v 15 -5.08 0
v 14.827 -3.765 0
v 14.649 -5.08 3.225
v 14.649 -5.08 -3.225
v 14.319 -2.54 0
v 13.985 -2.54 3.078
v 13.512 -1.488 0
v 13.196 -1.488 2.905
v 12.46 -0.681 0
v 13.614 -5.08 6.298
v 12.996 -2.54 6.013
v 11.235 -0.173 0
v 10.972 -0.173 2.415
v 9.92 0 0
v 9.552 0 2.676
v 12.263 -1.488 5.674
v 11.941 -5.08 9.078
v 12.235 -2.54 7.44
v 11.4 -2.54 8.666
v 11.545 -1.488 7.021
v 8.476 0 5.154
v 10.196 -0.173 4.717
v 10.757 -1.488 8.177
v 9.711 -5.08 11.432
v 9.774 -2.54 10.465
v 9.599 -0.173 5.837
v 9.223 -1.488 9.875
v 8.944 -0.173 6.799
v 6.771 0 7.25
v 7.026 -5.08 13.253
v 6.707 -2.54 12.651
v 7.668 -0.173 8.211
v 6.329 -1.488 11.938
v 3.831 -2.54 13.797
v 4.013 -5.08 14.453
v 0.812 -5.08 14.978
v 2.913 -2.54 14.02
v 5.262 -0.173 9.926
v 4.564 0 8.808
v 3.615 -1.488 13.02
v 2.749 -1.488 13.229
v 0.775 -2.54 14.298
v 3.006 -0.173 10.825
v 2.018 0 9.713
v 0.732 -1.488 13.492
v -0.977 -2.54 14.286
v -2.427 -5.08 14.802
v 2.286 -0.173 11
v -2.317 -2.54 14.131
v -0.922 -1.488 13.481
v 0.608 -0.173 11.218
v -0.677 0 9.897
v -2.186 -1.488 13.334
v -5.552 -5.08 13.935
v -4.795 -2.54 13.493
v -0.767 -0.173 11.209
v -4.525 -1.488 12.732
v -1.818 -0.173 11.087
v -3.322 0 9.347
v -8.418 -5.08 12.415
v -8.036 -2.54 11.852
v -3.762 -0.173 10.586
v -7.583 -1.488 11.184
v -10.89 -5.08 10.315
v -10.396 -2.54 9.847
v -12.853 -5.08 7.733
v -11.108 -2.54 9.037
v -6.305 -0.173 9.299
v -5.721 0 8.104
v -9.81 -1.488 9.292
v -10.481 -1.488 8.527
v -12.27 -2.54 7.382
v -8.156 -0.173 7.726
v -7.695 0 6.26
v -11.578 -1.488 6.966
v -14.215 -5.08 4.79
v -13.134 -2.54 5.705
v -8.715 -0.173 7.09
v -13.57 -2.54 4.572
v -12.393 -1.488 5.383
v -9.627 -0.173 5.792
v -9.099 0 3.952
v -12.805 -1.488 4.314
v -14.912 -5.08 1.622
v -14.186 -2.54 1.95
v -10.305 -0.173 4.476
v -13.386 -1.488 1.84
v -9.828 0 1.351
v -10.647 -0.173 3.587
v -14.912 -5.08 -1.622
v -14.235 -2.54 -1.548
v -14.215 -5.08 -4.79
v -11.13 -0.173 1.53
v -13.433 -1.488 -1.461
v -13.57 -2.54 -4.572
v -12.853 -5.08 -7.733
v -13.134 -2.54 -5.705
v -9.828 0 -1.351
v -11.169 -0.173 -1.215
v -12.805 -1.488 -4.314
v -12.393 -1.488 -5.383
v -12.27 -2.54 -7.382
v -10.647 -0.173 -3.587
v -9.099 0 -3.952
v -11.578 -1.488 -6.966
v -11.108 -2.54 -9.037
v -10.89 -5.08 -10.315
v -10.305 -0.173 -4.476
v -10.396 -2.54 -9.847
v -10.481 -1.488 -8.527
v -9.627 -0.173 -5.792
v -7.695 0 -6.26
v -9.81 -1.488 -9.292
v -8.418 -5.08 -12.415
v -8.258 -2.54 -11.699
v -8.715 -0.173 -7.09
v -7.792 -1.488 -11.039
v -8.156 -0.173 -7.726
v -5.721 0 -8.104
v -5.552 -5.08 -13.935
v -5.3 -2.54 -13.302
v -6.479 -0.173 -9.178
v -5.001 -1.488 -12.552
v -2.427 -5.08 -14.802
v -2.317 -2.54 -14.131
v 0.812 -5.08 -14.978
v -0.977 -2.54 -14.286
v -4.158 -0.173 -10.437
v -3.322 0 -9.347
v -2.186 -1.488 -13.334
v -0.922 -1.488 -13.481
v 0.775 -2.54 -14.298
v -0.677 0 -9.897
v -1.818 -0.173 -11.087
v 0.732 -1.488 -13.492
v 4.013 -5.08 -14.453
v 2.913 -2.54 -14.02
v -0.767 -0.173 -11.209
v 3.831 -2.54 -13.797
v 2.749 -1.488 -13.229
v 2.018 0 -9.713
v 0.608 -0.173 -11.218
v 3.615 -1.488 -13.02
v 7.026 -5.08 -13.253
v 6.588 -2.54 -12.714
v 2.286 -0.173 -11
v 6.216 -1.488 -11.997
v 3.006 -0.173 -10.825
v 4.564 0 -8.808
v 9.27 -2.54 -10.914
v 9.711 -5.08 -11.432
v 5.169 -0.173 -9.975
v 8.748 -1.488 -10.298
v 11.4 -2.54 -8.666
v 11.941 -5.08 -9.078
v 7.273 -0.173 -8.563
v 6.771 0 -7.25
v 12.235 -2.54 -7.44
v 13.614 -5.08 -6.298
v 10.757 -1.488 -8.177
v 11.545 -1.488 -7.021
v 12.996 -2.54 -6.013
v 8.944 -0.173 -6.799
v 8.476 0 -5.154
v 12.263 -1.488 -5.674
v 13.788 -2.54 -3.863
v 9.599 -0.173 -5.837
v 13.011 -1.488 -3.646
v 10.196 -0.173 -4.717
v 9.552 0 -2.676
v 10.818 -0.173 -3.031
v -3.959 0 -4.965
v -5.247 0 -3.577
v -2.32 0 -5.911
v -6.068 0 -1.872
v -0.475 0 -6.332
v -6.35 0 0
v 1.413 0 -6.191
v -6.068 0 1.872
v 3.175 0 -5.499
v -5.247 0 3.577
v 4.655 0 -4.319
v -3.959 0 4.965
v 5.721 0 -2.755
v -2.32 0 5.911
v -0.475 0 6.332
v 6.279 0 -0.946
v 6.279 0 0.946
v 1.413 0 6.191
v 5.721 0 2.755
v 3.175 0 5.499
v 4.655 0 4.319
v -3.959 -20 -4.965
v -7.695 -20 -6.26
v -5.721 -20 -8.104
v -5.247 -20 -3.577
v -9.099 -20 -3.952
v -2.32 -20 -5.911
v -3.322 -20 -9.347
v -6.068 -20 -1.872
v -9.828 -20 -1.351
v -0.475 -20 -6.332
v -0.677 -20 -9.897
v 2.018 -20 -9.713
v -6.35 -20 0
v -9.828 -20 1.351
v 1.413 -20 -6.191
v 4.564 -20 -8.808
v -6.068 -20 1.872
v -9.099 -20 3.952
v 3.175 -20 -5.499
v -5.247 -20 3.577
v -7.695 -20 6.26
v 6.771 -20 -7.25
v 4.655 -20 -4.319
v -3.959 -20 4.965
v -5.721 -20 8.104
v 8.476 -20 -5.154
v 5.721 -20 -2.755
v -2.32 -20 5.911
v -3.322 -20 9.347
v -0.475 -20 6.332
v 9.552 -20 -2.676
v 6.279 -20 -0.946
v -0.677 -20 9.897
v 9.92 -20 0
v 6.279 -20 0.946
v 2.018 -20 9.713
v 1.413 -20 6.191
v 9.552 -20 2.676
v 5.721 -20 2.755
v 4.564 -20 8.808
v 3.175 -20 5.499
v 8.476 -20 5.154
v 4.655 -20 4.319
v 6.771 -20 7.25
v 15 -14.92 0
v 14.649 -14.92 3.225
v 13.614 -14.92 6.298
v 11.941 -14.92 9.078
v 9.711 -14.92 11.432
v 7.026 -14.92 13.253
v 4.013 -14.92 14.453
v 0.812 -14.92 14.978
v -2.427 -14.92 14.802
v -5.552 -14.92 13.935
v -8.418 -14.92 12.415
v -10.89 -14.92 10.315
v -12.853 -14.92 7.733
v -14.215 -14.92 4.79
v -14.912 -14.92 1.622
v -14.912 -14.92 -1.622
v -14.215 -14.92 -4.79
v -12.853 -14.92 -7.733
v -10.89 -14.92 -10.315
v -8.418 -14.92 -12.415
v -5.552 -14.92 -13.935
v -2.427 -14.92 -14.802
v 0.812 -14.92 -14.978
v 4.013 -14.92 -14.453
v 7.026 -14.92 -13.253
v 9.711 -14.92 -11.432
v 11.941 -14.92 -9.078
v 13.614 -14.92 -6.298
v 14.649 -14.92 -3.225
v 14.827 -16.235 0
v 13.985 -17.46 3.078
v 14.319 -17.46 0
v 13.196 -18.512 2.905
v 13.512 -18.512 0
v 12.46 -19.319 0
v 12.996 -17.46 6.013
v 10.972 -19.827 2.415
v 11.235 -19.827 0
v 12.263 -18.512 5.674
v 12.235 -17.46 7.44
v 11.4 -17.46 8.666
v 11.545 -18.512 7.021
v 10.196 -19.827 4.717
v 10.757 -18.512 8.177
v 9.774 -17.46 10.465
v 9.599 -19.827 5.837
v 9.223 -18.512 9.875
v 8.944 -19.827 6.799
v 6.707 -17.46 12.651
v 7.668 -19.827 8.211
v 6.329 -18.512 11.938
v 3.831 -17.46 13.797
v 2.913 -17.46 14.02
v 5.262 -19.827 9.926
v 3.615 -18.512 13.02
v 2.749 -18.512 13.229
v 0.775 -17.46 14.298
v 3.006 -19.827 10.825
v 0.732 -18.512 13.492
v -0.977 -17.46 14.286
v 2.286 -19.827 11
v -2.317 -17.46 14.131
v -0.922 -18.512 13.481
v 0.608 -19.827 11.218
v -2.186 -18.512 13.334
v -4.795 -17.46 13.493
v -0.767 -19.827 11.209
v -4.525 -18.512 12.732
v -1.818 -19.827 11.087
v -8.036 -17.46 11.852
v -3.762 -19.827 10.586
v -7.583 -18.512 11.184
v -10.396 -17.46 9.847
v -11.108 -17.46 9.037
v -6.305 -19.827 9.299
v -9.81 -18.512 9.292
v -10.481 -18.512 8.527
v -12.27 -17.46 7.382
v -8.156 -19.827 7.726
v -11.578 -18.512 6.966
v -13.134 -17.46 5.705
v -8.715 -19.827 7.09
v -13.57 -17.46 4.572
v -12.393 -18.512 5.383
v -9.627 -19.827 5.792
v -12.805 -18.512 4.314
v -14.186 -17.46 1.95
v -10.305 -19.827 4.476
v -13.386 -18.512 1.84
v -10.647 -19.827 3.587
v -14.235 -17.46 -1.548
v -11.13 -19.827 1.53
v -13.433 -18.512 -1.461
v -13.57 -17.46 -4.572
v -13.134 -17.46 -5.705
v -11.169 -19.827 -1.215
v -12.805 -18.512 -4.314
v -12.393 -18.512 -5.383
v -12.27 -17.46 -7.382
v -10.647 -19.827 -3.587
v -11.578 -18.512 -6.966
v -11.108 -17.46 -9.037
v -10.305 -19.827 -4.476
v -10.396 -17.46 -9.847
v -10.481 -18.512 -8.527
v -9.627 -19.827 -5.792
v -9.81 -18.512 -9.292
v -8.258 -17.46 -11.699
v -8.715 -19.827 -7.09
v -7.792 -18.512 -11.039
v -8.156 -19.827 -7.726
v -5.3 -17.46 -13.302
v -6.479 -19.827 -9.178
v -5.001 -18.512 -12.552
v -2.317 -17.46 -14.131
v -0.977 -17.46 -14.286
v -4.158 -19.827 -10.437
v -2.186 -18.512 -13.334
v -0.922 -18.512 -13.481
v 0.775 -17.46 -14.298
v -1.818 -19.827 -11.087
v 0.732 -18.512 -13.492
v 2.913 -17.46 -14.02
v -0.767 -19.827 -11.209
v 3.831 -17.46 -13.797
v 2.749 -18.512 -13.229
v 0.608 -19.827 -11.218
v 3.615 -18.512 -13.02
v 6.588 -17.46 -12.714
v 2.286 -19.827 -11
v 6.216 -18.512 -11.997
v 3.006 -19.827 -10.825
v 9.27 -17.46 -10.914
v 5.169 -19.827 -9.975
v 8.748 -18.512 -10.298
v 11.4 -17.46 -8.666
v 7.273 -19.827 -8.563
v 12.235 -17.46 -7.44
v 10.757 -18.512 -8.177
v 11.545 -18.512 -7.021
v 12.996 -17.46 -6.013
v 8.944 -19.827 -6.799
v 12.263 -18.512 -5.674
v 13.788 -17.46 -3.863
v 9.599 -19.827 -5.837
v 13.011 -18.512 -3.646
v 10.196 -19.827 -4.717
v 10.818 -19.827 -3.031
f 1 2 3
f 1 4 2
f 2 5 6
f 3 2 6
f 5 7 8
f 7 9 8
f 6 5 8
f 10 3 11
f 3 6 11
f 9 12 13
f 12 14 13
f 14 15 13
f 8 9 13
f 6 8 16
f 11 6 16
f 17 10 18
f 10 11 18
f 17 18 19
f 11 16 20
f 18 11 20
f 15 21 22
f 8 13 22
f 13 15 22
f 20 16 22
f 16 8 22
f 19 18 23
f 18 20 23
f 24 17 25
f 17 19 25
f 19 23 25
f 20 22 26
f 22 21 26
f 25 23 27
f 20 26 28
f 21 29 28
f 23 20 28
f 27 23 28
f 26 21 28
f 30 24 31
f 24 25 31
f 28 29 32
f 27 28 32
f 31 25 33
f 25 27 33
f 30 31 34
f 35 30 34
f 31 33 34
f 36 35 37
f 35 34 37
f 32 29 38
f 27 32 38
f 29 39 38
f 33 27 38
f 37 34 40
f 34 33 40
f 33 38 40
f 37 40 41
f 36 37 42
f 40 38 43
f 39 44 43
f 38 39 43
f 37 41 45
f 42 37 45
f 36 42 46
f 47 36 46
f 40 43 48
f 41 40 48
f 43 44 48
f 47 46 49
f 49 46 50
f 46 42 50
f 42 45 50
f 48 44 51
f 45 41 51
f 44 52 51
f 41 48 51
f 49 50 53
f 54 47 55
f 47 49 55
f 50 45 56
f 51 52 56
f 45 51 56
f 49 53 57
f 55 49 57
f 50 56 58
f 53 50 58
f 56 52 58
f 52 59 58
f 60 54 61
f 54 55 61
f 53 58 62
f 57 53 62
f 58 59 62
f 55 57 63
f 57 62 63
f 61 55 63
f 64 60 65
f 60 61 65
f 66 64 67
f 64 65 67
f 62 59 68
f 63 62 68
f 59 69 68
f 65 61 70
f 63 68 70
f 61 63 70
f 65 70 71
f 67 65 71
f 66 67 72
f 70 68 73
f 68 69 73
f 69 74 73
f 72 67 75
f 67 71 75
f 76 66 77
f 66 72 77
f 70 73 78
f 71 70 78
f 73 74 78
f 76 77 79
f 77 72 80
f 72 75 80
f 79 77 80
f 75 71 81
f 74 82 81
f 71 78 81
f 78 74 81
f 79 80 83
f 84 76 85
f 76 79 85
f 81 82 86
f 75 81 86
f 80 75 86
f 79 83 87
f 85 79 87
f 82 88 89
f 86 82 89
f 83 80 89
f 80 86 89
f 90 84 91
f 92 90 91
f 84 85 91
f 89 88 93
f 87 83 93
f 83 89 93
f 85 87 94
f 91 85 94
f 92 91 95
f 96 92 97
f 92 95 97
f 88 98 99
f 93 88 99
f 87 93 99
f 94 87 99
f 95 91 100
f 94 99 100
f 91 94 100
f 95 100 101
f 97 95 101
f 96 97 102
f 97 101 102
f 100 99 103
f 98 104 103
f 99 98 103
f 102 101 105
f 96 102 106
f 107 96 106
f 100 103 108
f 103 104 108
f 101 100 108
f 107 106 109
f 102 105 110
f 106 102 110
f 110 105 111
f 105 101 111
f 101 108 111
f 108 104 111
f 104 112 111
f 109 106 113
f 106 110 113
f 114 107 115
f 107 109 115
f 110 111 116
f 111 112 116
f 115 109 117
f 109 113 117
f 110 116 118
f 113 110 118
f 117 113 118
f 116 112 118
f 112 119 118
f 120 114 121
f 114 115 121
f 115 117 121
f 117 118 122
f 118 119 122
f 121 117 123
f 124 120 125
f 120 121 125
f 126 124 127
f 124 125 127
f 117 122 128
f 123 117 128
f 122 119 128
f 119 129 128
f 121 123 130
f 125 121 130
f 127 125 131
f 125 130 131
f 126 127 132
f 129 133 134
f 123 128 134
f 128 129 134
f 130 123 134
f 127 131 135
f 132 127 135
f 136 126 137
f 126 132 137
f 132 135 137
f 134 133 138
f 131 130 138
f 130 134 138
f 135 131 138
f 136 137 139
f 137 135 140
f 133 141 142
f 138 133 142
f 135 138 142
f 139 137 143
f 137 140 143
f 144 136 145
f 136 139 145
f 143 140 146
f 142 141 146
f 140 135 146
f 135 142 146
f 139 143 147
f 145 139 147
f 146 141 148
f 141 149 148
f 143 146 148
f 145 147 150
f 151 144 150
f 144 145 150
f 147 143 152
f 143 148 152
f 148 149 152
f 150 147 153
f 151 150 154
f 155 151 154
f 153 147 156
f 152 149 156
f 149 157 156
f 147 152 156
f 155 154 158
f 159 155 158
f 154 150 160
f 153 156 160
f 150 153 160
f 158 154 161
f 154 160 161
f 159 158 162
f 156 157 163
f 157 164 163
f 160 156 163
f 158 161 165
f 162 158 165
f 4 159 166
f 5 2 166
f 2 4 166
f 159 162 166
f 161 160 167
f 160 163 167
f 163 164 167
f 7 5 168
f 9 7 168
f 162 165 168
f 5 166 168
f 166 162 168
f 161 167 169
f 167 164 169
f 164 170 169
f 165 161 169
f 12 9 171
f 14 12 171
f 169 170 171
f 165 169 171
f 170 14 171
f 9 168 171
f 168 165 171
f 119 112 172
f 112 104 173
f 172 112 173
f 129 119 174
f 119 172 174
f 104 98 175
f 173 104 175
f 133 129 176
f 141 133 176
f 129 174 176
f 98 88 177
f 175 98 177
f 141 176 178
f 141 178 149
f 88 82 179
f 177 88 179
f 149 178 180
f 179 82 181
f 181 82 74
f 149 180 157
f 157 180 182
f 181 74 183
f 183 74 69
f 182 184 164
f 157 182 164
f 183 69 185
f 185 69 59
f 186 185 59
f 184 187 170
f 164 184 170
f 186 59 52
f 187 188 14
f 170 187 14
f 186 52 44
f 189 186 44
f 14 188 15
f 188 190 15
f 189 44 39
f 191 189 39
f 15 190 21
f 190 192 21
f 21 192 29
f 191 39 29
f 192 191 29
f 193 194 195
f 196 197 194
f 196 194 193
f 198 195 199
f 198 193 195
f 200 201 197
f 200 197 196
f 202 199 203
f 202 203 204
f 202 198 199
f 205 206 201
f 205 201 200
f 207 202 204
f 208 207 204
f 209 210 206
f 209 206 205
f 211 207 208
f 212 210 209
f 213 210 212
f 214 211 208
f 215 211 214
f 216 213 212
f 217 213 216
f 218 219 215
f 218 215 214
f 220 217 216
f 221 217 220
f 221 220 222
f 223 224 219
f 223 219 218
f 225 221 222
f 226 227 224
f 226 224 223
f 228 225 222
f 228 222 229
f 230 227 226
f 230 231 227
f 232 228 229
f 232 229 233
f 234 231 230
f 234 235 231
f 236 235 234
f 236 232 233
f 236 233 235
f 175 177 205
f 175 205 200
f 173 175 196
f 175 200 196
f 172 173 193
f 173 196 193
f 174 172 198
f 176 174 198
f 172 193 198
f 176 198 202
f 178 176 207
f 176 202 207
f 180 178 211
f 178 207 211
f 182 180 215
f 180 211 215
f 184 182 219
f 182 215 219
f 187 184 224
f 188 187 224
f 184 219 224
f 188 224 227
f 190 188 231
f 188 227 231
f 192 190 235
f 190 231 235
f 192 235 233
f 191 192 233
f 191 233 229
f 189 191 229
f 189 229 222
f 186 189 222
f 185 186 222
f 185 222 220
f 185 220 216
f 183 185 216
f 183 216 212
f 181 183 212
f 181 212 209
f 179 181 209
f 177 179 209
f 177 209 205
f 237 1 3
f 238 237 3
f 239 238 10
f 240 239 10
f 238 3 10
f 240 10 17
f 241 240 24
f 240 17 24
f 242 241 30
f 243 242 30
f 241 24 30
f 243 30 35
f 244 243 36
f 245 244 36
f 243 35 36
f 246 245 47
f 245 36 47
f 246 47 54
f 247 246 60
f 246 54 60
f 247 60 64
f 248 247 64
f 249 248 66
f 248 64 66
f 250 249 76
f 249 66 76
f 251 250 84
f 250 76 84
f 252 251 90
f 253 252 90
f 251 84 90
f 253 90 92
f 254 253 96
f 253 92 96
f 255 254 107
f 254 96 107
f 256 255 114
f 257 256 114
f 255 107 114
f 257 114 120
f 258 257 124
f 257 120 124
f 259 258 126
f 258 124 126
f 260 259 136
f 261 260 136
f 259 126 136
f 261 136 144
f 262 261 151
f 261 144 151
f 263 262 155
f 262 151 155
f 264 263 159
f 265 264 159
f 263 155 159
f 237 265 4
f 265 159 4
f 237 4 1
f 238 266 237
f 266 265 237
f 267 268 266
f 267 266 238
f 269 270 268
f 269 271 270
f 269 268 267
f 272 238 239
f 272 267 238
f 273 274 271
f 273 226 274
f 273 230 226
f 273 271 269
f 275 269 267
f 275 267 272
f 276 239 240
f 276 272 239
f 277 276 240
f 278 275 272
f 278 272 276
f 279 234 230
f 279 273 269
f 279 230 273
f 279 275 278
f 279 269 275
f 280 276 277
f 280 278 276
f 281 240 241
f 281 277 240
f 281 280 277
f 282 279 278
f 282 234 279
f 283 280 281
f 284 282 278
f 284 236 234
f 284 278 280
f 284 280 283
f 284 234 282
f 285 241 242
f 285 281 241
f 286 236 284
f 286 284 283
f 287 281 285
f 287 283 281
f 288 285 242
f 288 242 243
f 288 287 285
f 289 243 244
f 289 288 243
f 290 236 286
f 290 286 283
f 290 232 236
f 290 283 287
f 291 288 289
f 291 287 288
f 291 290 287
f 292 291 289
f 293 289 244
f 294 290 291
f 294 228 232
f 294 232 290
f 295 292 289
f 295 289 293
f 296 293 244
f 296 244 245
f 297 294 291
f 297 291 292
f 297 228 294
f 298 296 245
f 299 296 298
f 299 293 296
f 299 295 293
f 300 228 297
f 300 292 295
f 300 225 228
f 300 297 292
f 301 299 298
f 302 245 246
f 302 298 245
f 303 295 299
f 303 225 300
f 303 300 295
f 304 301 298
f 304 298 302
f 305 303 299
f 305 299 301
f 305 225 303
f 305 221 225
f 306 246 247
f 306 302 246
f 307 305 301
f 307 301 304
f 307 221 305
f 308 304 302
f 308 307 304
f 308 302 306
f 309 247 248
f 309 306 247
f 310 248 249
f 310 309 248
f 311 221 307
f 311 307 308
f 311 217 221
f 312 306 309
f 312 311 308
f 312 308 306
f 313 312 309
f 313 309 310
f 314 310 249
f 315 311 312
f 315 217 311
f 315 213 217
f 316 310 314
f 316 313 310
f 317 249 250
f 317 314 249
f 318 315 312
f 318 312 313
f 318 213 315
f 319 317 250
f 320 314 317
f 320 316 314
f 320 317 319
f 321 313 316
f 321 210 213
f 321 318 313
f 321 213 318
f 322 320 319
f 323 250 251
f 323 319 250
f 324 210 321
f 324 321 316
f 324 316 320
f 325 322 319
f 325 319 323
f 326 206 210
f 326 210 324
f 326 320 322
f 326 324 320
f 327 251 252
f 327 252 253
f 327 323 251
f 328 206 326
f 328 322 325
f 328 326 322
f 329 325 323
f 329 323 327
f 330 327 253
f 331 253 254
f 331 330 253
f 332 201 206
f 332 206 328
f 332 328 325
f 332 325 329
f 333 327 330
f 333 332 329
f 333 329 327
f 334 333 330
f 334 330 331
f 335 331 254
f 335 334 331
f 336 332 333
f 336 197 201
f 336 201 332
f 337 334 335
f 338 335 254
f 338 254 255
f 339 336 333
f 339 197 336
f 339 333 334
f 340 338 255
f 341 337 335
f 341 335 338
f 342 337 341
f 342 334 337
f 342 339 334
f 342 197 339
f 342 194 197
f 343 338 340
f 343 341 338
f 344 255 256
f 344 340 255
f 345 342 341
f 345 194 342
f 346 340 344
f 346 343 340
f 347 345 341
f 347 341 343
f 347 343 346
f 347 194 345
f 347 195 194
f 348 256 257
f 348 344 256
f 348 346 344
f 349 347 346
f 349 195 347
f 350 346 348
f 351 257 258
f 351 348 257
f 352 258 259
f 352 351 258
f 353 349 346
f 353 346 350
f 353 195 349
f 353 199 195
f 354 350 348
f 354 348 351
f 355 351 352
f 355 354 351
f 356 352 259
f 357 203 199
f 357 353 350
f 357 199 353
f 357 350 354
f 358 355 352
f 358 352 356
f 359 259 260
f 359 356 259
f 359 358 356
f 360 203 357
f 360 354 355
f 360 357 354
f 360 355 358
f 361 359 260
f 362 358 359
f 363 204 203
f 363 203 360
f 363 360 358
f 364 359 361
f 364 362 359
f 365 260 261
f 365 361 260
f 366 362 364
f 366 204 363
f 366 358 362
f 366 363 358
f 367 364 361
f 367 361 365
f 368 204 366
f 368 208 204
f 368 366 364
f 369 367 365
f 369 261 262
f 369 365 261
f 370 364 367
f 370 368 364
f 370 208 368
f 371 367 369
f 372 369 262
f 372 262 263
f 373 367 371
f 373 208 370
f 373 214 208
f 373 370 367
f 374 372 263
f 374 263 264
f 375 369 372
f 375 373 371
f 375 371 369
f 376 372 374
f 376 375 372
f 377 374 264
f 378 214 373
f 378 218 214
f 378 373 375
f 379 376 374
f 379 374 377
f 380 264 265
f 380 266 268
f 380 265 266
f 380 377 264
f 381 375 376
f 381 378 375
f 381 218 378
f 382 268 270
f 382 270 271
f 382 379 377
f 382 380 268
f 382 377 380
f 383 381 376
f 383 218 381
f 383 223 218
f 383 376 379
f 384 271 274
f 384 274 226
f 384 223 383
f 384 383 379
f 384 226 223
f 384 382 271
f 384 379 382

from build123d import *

# Parameters (mm, degrees)
F0_R     = 15
F1_DEPTH = 20
F2_R     = 5.08
F3_R     = 5.08
F5_D     = 12.7


with BuildPart() as f1:
    # F0 (on Front) → F1 (new body)
    with BuildSketch(Plane.XZ):
        Circle(F0_R)
    extrude(amount=F1_DEPTH)

    # F2
    f2_edges = [f1.edges().sort_by_distance(p)[0] for p in [
        (-15, -20, 0),
    ]]
    fillet(f2_edges, radius=F2_R)

    # F3
    f3_edges = [f1.edges().sort_by_distance(p)[0] for p in [
        (15, -7.46, 0),
        (-15, -14.92, 0),
        (-15, 0, 0),
    ]]
    fillet(f3_edges, radius=F3_R)

    # F5 (through all)
    with Locations(Plane(origin=(0, 0, 0), x_dir=(1, 0, 0), z_dir=(0, 1, 0))):
        with Locations((0, 0)):
            Hole(F5_D / 2)


solid = f1.part
